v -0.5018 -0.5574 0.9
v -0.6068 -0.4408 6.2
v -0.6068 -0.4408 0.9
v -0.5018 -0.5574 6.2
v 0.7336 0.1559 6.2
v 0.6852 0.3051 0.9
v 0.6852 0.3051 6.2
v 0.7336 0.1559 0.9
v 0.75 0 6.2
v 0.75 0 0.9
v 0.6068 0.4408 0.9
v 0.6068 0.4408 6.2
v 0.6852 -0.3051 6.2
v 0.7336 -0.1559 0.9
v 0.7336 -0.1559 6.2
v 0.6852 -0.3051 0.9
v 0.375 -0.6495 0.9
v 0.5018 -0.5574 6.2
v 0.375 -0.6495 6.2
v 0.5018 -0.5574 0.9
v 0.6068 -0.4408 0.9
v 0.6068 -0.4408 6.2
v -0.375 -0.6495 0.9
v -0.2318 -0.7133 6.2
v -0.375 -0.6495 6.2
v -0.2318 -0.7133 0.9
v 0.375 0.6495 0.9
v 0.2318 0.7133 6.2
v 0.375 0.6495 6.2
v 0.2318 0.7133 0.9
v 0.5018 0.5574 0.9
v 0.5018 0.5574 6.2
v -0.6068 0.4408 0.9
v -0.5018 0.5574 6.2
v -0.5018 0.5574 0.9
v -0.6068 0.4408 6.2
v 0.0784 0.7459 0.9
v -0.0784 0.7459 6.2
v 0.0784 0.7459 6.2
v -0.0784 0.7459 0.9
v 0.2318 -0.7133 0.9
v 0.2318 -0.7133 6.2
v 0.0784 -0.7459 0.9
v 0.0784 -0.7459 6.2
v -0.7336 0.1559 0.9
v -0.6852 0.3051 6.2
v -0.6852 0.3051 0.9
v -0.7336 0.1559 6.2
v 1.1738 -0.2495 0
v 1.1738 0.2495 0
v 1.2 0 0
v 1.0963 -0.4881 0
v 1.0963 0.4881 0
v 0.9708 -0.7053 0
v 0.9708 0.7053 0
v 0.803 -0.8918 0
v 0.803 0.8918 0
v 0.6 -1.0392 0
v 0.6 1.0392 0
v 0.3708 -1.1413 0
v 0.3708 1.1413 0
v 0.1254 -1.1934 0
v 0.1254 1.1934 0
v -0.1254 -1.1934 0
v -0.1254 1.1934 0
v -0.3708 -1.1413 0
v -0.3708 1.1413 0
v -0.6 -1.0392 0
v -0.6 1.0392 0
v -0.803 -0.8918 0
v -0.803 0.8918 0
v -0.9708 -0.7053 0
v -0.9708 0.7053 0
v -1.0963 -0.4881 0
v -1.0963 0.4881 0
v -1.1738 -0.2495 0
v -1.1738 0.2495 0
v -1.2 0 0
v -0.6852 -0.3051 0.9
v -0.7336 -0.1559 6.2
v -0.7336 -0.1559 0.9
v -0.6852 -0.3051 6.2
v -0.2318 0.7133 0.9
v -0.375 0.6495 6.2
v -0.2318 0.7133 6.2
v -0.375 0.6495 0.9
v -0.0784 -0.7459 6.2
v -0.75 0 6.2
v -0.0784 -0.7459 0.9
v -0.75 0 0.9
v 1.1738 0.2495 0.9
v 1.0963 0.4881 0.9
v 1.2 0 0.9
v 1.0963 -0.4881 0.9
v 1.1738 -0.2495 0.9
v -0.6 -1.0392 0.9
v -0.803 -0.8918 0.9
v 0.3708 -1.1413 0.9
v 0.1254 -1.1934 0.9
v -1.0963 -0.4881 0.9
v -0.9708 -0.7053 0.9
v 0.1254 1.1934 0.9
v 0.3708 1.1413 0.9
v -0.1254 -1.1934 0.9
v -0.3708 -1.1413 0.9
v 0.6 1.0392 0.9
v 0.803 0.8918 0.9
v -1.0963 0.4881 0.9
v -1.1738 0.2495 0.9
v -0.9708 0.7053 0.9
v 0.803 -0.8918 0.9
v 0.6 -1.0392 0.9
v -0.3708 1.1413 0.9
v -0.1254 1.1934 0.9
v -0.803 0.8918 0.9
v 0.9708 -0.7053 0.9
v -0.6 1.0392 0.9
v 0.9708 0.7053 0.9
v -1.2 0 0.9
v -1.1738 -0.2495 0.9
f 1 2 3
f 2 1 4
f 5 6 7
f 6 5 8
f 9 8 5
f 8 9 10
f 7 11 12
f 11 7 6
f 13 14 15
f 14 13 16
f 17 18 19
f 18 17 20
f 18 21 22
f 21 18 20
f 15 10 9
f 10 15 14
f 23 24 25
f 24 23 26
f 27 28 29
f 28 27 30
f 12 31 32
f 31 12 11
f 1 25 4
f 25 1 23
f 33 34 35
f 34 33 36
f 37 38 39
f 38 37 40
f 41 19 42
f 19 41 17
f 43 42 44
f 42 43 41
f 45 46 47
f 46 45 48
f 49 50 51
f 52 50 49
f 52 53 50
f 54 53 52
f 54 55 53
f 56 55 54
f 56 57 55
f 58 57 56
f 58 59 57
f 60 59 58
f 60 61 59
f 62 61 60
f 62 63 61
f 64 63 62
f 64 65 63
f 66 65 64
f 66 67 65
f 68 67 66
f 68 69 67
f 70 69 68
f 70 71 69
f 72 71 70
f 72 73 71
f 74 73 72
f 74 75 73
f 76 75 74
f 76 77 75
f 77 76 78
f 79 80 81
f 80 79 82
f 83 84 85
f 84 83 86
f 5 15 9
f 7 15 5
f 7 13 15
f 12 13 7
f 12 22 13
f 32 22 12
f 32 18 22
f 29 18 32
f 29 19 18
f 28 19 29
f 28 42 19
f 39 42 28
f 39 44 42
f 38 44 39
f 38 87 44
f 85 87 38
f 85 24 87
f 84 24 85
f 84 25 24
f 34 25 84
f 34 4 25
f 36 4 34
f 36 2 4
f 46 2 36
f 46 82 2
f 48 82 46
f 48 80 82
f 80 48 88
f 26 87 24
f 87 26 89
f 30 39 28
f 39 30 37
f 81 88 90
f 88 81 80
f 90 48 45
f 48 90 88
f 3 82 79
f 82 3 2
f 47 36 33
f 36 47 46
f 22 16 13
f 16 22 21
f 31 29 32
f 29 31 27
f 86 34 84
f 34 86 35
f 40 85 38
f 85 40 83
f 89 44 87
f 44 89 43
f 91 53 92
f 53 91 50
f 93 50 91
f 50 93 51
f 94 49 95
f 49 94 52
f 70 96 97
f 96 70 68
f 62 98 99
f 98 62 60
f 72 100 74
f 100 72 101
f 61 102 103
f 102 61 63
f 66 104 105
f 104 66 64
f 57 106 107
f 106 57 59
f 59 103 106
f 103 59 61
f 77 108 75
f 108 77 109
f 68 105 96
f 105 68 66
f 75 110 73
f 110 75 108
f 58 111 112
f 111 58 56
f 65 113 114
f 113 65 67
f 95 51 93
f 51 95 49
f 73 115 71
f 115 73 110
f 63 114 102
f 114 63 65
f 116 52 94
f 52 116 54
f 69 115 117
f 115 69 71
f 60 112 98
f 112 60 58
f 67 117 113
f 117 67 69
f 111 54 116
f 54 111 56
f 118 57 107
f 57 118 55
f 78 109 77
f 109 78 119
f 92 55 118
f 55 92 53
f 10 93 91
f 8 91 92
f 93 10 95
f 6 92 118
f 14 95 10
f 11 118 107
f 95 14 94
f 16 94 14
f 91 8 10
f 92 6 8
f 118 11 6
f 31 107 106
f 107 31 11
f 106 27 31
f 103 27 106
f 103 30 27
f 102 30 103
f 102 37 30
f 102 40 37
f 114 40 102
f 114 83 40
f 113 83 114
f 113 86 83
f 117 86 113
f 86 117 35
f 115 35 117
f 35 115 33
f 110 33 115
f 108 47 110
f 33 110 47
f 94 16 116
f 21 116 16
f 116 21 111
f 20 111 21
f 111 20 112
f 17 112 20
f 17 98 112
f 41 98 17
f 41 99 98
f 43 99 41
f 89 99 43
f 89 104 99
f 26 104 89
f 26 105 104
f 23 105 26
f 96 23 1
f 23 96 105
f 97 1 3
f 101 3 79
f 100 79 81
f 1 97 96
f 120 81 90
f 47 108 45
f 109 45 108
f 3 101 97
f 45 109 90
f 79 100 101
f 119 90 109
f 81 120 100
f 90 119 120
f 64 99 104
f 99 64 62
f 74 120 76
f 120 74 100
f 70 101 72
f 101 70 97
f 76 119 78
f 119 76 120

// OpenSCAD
// part_id: b8
// name: B8 rivet pin
// source_drawing_ids: DRW-002
// units: mm
// revision: 0.1
// SPDX-License-Identifier: MIT

module part_b8(pin_d = 1.5, pin_h = 6.2, head_d = 2.4, head_h = 0.9) {
    union() {
        cylinder(d = pin_d, h = pin_h, center = false, $fn = 30);
        cylinder(d = head_d, h = head_h, center = false, $fn = 30);
    }
}

// ---- "main guard" ----
// Default to previewing when opened directly:
if (is_undef(__LIB_MODE__)) {
    part_b8();
}
